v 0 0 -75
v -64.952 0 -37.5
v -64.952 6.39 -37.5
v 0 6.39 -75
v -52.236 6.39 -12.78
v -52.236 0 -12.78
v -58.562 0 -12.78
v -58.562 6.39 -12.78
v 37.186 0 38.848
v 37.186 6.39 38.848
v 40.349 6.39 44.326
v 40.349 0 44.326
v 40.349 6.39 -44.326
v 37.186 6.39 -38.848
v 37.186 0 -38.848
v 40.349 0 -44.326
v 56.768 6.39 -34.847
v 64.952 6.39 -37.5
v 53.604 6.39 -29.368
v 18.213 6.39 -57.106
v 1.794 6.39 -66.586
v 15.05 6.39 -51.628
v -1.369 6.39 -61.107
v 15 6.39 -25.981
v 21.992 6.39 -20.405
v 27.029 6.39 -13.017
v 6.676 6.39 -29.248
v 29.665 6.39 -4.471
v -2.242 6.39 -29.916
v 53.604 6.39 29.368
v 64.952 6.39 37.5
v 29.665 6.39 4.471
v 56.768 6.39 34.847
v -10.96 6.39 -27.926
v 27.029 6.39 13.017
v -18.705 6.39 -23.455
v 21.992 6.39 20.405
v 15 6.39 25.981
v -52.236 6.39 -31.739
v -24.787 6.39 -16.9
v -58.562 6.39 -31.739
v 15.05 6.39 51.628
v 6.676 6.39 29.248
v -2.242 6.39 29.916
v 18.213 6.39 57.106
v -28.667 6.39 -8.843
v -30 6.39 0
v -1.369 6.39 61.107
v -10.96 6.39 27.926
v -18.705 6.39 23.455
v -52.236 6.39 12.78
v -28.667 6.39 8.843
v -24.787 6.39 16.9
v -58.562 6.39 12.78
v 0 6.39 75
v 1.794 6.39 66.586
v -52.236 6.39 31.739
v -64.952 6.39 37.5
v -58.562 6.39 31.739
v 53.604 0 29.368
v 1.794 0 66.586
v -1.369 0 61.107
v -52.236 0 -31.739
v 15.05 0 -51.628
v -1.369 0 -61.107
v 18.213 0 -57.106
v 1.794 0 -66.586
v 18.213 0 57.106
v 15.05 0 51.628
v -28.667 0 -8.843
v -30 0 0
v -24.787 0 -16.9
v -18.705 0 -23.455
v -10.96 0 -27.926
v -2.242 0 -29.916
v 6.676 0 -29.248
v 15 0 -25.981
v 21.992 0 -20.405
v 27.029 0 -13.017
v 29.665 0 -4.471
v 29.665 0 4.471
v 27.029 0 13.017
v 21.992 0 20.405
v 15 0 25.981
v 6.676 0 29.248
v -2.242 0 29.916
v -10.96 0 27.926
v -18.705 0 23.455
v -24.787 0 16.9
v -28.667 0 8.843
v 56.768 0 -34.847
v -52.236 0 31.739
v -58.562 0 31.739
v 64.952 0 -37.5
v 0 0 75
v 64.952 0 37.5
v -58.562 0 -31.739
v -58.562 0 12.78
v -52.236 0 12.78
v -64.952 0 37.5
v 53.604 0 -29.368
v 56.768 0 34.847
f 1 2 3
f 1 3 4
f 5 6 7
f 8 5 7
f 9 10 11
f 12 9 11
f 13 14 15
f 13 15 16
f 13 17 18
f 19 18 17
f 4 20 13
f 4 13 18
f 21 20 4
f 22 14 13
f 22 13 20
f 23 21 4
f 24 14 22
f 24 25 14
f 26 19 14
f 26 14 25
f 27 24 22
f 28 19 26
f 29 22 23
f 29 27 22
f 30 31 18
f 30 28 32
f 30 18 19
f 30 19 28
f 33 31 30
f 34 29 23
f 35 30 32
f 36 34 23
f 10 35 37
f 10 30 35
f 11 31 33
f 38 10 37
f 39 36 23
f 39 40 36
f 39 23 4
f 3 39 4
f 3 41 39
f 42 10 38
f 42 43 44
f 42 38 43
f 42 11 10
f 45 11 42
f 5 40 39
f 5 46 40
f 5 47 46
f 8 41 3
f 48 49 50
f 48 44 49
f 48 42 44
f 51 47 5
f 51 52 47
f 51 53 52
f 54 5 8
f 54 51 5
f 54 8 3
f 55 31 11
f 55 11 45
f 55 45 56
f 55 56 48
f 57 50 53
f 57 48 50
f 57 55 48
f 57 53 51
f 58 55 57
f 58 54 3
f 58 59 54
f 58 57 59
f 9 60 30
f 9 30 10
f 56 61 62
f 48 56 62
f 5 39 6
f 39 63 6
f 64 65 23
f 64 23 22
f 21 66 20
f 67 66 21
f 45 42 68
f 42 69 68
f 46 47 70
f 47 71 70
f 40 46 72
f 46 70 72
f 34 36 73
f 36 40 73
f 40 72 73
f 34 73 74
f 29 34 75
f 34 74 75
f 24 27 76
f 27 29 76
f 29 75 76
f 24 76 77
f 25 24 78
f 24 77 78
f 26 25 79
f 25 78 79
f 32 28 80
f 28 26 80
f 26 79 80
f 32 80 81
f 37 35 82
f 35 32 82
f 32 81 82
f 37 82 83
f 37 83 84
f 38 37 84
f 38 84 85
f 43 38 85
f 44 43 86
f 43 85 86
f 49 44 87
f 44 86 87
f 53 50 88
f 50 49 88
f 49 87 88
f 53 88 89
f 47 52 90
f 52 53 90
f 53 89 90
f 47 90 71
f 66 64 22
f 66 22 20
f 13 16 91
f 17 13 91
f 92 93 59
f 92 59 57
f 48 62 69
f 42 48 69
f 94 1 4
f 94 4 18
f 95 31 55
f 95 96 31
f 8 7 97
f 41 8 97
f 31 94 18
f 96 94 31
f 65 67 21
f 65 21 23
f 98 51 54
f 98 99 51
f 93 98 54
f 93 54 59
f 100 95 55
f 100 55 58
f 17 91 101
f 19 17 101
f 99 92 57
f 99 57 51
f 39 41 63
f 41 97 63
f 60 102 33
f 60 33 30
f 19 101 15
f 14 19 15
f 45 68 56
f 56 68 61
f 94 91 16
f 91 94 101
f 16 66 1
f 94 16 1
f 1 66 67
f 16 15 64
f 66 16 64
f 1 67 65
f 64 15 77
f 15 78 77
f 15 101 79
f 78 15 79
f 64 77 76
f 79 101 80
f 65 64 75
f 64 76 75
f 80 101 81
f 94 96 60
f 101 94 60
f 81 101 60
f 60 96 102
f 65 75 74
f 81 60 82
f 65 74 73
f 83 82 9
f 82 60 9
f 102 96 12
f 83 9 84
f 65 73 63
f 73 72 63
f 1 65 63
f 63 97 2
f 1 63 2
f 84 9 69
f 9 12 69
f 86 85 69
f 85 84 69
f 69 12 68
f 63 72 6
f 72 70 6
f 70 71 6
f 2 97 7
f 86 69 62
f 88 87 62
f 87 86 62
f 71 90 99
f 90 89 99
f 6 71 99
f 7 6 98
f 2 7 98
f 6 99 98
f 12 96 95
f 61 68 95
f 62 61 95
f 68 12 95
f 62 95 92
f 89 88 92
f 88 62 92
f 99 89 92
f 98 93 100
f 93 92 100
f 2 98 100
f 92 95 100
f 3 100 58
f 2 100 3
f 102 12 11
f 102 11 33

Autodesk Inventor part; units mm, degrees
ref_plane "YZ Plane" through (0, 0, 0) normal (1, 0, 0) x (0, 1, 0)
ref_plane "XZ Plane" through (0, 0, 0) normal (0, 1, 0) x (-1, 0, 0)
ref_plane "XY Plane" through (0, 0, 0) normal (0, 0, 1) x (1, 0, 0)
sketch "Sketch1" plane through (0, 0, 0) normal (0, 1, 0) x (-1, 0, 0)
  circle A0 centre (0, 0) radius 30
  line L0 (64.9519, -37.5) -> (0, -75)
  line L1 (0, -75) -> (-64.9519, -37.5)
  line L2 (-64.9519, -37.5) -> (-64.9519, 37.5)
  line L3 (-64.9519, 37.5) -> (0, 75)
  line L4 (0, 75) -> (64.9519, 37.5)
  line L5 (64.9519, 37.5) -> (64.9519, -37.5)
  line L6 (58.5619, 31.7388) -> (52.2358, 31.7388)
  line L7 (52.2358, 31.7388) -> (52.2358, 12.78)
  line L8 (52.2358, 12.78) -> (58.5619, 12.78)
  line L9 (58.5619, 12.78) -> (58.5619, 31.7388)
  line L10 (64.9519, 0) -> (0, 0) construction
  line L11 (58.5619, -31.7388) -> (52.2358, -31.7388)
  line L12 (52.2358, -31.7388) -> (52.2358, -12.78)
  line L13 (52.2358, -12.78) -> (58.5619, -12.78)
  line L14 (58.5619, -12.78) -> (58.5619, -31.7388)
  line L15 (-40.3488, 44.3261) -> (-56.7676, 34.8467)
  line L16 (-56.7676, 34.8467) -> (-53.6045, 29.3681)
  line L17 (-53.6045, 29.3681) -> (-37.1857, 38.8475)
  line L18 (-37.1857, 38.8475) -> (-40.3488, 44.3261)
  line L19 (-15.0501, 51.6275) -> (-18.2131, 57.1061)
  line L20 (-18.2131, 57.1061) -> (-1.7943, 66.5855)
  line L21 (-1.7943, 66.5855) -> (1.3687, 61.1069)
  line L22 (1.3687, 61.1069) -> (-15.0501, 51.6275)
  line L23 (-18.2131, -57.1061) -> (-1.7943, -66.5855)
  line L24 (-1.7943, -66.5855) -> (1.3687, -61.1069)
  line L25 (1.3687, -61.1069) -> (-15.0501, -51.6275)
  line L26 (-15.0501, -51.6275) -> (-18.2131, -57.1061)
  line L27 (-37.1857, -38.8475) -> (-40.3488, -44.3261)
  line L28 (-40.3488, -44.3261) -> (-56.7676, -34.8467)
  line L29 (-56.7676, -34.8467) -> (-53.6045, -29.3681)
  line L30 (-53.6045, -29.3681) -> (-37.1857, -38.8475)
  line L31 (55.3989, -12.78) -> (55.3989, 12.78) construction
  dimension "d0" = 60
  dimension "d3" = 6.3261
  dimension "d4" = 18.9588
  dimension "d5" = 6.39
  dimension "d6" = 12.78
  dimension "d9" = 360
  dimension "d13" = 75
  dimension "d14" = 150
  dimension "LightDiskArm" = 55.3989
  dimension "d16" = 58.5619
  dimension "d17" = 129.9038
extrude "Extrusion1" add sketch "Sketch1" along normal blind 6.39
equation "\"d3\" = 0.99 * WoodThickness"
equation "\"d4\" = 0.25 * DiskGap"
equation "\"d5\" = WoodThickness"
equation "\"d6\" = 2 * WoodThickness"
equation "\"d11\" = WoodThickness"
equation "\"WoodThickness\" = 6.39"
equation "\"DiskGap\" = 75.835317"
properties part number "LightDiskBottom" material "MDF Medium Density Fiberboard"
